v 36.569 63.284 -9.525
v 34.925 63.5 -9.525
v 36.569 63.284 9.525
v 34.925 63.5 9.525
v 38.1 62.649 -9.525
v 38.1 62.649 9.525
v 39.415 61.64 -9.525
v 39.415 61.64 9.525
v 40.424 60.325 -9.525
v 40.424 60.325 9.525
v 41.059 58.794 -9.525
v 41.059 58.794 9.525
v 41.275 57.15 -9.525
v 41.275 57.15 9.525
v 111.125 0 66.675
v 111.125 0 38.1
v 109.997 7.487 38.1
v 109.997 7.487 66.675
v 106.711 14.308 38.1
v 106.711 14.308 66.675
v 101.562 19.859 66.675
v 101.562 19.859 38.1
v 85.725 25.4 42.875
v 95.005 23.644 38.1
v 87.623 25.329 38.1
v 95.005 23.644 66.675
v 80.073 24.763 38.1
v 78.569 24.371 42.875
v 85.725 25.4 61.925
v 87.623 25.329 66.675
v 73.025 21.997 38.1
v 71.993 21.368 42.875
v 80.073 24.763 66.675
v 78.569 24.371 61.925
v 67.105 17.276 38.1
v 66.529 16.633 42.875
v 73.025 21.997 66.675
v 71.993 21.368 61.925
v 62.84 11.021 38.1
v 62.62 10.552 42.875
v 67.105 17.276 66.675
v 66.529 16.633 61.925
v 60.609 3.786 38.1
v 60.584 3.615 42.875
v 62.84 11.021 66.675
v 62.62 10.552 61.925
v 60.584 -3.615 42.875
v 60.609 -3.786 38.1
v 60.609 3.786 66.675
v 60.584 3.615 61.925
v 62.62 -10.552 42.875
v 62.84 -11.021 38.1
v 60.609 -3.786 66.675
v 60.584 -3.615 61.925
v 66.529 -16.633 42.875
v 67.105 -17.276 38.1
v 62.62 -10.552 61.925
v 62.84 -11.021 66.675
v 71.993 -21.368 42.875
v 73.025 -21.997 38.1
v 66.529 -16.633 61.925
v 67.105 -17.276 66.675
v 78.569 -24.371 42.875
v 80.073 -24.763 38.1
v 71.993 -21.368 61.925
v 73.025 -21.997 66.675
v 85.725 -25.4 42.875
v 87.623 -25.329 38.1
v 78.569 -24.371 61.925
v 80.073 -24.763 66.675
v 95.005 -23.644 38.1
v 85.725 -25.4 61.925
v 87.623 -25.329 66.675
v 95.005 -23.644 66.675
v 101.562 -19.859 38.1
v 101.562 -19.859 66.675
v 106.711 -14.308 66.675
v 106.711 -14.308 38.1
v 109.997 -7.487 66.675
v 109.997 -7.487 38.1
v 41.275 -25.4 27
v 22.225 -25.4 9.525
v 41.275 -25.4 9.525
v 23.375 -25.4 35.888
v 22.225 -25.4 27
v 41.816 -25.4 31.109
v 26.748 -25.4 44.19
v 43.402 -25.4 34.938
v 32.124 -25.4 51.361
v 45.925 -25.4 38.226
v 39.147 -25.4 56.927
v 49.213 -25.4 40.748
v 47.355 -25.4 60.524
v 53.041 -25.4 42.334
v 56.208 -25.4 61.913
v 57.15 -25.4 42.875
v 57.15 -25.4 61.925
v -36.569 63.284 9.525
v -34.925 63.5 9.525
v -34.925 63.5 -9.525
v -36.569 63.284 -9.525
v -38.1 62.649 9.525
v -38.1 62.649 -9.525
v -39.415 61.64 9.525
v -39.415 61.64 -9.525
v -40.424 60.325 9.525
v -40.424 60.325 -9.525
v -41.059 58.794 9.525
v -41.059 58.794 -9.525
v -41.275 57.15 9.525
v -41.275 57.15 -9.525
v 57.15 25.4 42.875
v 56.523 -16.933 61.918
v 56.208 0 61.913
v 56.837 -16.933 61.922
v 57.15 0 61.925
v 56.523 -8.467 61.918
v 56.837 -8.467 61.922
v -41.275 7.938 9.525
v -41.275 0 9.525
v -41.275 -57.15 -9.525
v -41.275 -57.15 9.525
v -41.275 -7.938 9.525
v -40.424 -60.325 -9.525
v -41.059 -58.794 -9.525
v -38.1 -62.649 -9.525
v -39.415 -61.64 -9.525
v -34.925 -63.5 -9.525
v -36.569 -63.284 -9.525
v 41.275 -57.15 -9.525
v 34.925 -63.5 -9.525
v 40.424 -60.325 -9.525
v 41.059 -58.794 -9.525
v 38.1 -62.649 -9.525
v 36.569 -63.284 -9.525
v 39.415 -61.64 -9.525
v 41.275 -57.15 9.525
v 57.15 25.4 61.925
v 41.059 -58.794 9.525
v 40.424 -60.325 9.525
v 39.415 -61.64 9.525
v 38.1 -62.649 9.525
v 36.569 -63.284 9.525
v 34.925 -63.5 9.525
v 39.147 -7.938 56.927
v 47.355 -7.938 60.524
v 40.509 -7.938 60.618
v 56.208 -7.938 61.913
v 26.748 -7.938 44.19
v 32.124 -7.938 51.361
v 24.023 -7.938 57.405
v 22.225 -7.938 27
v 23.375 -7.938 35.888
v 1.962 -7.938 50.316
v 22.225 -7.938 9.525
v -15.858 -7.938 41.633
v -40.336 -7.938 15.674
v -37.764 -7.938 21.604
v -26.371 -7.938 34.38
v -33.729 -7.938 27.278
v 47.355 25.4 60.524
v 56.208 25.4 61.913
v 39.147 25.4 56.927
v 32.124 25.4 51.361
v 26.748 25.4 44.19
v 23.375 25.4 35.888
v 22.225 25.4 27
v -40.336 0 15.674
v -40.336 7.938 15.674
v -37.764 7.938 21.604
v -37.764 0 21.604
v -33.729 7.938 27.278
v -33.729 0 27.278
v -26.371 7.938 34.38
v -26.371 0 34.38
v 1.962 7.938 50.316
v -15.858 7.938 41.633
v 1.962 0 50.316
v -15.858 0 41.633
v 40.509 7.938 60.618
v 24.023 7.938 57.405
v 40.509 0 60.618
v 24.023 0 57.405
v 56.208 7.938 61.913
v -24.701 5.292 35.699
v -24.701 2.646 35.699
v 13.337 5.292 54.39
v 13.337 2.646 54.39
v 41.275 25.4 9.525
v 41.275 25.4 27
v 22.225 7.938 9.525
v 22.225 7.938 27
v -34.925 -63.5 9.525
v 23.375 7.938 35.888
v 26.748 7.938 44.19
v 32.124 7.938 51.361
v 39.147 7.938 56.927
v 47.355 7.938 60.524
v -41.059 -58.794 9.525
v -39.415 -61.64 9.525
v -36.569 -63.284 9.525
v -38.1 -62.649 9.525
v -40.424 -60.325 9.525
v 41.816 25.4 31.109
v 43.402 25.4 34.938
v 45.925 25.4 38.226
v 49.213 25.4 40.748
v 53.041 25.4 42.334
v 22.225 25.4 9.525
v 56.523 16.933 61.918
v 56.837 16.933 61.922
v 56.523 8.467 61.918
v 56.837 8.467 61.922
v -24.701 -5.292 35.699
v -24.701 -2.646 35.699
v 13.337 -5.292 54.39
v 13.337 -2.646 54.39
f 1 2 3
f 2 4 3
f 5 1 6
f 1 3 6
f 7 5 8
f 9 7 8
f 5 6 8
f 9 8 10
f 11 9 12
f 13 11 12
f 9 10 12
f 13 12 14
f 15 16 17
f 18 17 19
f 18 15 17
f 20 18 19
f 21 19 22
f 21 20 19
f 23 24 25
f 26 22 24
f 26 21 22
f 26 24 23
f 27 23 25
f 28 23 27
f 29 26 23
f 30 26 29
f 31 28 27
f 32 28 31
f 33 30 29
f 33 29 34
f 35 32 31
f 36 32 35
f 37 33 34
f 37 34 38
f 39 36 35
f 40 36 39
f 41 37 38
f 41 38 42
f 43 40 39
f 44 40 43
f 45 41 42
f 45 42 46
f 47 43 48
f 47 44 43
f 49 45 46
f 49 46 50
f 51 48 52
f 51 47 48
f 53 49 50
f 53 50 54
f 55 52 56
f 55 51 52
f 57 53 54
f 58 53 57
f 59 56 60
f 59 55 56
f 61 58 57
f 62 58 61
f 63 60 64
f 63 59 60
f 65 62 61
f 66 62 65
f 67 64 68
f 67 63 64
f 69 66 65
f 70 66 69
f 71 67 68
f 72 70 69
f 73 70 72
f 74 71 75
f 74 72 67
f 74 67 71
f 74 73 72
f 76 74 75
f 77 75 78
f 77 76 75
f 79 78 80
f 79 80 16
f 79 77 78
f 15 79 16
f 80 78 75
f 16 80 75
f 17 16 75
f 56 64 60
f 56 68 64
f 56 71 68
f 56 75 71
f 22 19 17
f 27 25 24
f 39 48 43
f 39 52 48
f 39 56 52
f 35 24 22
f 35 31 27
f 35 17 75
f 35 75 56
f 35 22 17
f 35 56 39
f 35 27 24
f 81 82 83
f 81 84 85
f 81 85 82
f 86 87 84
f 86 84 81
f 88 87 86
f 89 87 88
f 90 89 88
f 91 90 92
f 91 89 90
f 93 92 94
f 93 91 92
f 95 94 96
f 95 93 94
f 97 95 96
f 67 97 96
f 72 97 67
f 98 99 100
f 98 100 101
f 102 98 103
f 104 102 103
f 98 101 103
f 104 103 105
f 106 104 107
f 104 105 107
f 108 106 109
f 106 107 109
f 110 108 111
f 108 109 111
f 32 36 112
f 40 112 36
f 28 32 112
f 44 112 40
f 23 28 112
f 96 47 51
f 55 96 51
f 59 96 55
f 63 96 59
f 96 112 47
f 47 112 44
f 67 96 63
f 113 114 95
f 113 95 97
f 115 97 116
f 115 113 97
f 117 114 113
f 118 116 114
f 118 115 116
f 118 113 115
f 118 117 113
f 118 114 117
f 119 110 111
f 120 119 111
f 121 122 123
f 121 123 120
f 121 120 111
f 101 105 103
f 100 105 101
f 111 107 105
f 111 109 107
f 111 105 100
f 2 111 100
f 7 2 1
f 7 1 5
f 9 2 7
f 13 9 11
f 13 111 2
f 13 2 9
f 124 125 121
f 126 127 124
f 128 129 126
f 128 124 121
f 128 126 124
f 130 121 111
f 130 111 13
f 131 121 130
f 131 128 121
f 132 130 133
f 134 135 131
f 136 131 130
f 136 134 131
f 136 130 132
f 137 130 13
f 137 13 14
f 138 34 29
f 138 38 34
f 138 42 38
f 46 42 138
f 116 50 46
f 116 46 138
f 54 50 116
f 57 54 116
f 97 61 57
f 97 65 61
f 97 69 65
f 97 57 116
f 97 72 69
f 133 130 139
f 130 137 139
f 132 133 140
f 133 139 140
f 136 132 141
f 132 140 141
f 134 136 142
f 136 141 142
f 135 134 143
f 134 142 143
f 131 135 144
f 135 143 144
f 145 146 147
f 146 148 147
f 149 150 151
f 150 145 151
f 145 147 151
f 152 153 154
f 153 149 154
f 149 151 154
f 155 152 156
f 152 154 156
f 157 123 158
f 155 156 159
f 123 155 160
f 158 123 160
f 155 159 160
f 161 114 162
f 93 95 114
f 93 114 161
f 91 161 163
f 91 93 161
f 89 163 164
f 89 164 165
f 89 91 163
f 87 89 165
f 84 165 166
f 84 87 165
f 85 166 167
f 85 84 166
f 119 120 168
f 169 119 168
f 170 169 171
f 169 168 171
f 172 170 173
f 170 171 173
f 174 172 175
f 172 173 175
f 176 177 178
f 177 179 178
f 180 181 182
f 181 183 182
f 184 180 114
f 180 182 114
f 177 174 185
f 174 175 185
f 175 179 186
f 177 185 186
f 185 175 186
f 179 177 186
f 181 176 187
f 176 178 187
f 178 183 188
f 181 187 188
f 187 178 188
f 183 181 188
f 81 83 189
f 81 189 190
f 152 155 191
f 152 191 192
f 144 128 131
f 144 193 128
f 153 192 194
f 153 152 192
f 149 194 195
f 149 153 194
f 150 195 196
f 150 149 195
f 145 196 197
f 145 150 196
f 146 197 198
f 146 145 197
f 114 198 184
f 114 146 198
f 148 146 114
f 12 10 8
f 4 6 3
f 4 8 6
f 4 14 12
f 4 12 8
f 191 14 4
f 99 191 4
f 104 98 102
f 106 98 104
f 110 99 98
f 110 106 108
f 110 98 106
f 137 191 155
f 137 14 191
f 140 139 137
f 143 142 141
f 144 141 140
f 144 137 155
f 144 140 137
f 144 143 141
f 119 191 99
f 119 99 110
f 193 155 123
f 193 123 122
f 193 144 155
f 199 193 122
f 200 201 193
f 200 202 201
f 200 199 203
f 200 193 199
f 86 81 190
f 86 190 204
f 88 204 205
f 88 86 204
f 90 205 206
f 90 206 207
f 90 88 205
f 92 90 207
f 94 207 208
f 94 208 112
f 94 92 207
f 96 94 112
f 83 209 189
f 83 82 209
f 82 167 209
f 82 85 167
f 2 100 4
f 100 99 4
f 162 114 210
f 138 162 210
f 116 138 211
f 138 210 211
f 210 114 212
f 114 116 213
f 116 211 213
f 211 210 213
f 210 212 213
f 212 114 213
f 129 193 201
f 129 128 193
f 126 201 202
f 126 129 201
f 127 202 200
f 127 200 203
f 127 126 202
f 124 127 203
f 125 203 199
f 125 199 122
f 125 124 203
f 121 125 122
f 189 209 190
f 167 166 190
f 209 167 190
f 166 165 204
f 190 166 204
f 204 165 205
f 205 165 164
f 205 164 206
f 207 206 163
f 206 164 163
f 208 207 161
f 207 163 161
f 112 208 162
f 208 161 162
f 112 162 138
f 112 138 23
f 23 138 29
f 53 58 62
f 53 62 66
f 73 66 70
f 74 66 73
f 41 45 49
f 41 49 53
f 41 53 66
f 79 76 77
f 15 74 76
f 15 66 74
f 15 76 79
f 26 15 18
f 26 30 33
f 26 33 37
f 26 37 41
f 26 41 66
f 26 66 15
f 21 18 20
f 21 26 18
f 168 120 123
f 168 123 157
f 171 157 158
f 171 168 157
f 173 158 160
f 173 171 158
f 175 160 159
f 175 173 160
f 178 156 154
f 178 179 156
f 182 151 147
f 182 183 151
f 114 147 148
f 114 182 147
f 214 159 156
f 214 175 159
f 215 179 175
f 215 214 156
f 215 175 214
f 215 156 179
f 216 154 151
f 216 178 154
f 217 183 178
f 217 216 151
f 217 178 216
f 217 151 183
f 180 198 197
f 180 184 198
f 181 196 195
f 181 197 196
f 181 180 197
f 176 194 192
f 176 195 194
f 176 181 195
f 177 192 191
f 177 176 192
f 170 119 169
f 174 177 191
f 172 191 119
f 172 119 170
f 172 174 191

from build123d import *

# Parameters (mm, degrees)
F1_DEPTH = 63.5
F0_W     = 25.4
F0_H     = 19.05
F2_DEPTH = 25.4
F3_DEPTH = 7.9375
F5_R     = 6.35


with BuildPart() as f1:
    # F0 (on Front) → F1 (new body, symmetric)
    with BuildSketch(Plane.XZ):
        Polygon((-41.275, -9.525), (41.275, -9.525), (41.275, 9.525), (22.225, 9.525), (-41.275, 9.525), align=None)
    extrude(amount=F1_DEPTH, both=True)

    # F0 (on Front) → F3 (join, symmetric)
    with BuildSketch(Plane.XZ):
        with BuildLine():
            add(Edge.make_bspline(
                [(-41.275, 9.525), (-40.9770567973, 38.2124460487), (16.4634570461, 61.2015549145), (56.2082941288, 61.9125017725)],
                knots=[0, 0, 0, 0, 110.6276774511, 110.6276774511, 110.6276774511, 110.6276774511], degree=3))
            Line((-41.275, 9.525), (22.225, 9.525))
            Line((22.225, 9.525), (22.225, 27.0002))
            ThreePointArc((22.225, 27.0002), (32.1235669486, 51.360685909), (56.2082941288, 61.9125017725))
        make_face()
    extrude(amount=F3_DEPTH, both=True)

    # F5
    f5_edges = [f1.edges().sort_by_distance(p)[0] for p in [
        (41.275, -63.5, 0),
        (-41.275, -63.5, 0),
        (41.275, 63.5, 0),
        (-41.275, 63.5, 0),
    ]]
    fillet(f5_edges, radius=F5_R)


with BuildPart() as f2:
    # F0 (on Front) → F2 (new body, symmetric)
    with BuildSketch(Plane.XZ):
        with BuildLine():
            Line((22.225, 9.525), (41.275, 9.525))
            Line((41.275, 9.525), (41.275, 27.0002))
            ThreePointArc((41.275, 27.0002), (45.9246798487, 38.2255201513), (57.15, 42.8752))
            Line((57.15, 42.8752), (60.325, 42.8752))
            Line((60.325, 42.8752), (60.325, 61.9252))
            Line((60.325, 61.9252), (57.15, 61.9252))
            add(Edge.make_bspline(
                [(56.2082941288, 61.9125017725), (56.5233202368, 61.9181368898), (56.8372346161, 61.9223723844), (57.15, 61.9252)],
                knots=[110.6276774511, 110.6276774511, 110.6276774511, 110.6276774511, 111.5045361635, 111.5045361635, 111.5045361635, 111.5045361635], degree=3))
            ThreePointArc((56.2082941288, 61.9125017725), (32.1235669486, 51.360685909), (22.225, 27.0002))
            Line((22.225, 27.0002), (22.225, 9.525))
        make_face()
        with Locations((73.025, 52.4002)):
            Rectangle(F0_W, F0_H)
    extrude(amount=F2_DEPTH, both=True)

    # F0 (on Front) → F4 (revolve)
    with BuildSketch(Plane.XZ):
        Polygon((85.725, 61.9252), (85.725, 42.8752), (85.725, 38.1), (111.125, 38.1), (111.125, 66.675), (85.725, 66.675), align=None)
    revolve(axis=Axis((85.725, 0, 52.3875), (0, 0, 1)))


solid = Compound([f1.part, f2.part])
